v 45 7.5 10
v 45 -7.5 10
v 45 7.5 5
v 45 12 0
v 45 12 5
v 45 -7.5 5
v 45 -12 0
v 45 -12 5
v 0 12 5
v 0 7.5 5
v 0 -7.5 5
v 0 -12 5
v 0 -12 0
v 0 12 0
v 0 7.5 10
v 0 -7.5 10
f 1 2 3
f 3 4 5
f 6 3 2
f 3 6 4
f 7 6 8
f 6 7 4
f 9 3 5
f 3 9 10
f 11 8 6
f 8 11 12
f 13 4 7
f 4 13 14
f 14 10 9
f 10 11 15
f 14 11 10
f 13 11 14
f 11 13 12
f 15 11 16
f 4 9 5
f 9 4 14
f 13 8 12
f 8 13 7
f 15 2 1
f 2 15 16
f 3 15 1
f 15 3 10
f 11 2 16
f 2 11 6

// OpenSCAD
// file: Library/center.scad
module center(axis){
	translate((axis / -2.0)){
		children();
	}
}
// file: CylinderDispenser_Rail_Wall.scad
use <Library/center.scad>

//Length, width, height. Length is gonna be the rail length, which is the spring length plus the paddle thiccness.
dimensions = [50, 10, 5];
module CylinderDispenser_Rail_Wall(dimensions){
	//The walls still "grow" forwards, but it's the parent module's job to translate/rotate/mirror it
	center([0, dimensions[1], 0]){
		cube(dimensions);
	}
}
CylinderDispenser_Rail_Wall(dimensions);
// file: CylinderDispenser_Rail_Floor.scad
use <Library/center.scad>
//Length, width, height. The length is how long the rail is, starting at the center of the flue, going back.
dimensions = [50, 50, 5];
module CylinderDispenser_Rail_Floor(dimensions){
	center([0, dimensions[1], 0]) cube(dimensions);
}
CylinderDispenser_Rail_Floor(dimensions);
// main file
use <CylinderDispenser_Rail_Floor.scad>
use <CylinderDispenser_Rail_Wall.scad>

//Rail should allow for any shape to be cut into it, so you could make an ejector that is star shaped if you want it to.
//Really this whole thing is just positive space waiting for other things to cut it, like the Flue and the Ejector.

//Length, width, height of the floor
floorDimensions = [45, 24, 5];
//Length, width, and height of the rail. Rail length should be the same as the floor length.
wallDimensions = [45, 15, 5];
/* [Rail] [Wall] */
//Get rail walls that stick up out of the floor to better help guide the ejector
railWall = true;

module CylinderDispenser_Rail(floorDimensions, railWall, wallDimensions){
	union(){
		CylinderDispenser_Rail_Floor(floorDimensions);
		if(railWall){
			translate([0, 0, floorDimensions.z])
			CylinderDispenser_Rail_Wall(wallDimensions);
		}
	}
}

CylinderDispenser_Rail(floorDimensions, railWall, wallDimensions);
